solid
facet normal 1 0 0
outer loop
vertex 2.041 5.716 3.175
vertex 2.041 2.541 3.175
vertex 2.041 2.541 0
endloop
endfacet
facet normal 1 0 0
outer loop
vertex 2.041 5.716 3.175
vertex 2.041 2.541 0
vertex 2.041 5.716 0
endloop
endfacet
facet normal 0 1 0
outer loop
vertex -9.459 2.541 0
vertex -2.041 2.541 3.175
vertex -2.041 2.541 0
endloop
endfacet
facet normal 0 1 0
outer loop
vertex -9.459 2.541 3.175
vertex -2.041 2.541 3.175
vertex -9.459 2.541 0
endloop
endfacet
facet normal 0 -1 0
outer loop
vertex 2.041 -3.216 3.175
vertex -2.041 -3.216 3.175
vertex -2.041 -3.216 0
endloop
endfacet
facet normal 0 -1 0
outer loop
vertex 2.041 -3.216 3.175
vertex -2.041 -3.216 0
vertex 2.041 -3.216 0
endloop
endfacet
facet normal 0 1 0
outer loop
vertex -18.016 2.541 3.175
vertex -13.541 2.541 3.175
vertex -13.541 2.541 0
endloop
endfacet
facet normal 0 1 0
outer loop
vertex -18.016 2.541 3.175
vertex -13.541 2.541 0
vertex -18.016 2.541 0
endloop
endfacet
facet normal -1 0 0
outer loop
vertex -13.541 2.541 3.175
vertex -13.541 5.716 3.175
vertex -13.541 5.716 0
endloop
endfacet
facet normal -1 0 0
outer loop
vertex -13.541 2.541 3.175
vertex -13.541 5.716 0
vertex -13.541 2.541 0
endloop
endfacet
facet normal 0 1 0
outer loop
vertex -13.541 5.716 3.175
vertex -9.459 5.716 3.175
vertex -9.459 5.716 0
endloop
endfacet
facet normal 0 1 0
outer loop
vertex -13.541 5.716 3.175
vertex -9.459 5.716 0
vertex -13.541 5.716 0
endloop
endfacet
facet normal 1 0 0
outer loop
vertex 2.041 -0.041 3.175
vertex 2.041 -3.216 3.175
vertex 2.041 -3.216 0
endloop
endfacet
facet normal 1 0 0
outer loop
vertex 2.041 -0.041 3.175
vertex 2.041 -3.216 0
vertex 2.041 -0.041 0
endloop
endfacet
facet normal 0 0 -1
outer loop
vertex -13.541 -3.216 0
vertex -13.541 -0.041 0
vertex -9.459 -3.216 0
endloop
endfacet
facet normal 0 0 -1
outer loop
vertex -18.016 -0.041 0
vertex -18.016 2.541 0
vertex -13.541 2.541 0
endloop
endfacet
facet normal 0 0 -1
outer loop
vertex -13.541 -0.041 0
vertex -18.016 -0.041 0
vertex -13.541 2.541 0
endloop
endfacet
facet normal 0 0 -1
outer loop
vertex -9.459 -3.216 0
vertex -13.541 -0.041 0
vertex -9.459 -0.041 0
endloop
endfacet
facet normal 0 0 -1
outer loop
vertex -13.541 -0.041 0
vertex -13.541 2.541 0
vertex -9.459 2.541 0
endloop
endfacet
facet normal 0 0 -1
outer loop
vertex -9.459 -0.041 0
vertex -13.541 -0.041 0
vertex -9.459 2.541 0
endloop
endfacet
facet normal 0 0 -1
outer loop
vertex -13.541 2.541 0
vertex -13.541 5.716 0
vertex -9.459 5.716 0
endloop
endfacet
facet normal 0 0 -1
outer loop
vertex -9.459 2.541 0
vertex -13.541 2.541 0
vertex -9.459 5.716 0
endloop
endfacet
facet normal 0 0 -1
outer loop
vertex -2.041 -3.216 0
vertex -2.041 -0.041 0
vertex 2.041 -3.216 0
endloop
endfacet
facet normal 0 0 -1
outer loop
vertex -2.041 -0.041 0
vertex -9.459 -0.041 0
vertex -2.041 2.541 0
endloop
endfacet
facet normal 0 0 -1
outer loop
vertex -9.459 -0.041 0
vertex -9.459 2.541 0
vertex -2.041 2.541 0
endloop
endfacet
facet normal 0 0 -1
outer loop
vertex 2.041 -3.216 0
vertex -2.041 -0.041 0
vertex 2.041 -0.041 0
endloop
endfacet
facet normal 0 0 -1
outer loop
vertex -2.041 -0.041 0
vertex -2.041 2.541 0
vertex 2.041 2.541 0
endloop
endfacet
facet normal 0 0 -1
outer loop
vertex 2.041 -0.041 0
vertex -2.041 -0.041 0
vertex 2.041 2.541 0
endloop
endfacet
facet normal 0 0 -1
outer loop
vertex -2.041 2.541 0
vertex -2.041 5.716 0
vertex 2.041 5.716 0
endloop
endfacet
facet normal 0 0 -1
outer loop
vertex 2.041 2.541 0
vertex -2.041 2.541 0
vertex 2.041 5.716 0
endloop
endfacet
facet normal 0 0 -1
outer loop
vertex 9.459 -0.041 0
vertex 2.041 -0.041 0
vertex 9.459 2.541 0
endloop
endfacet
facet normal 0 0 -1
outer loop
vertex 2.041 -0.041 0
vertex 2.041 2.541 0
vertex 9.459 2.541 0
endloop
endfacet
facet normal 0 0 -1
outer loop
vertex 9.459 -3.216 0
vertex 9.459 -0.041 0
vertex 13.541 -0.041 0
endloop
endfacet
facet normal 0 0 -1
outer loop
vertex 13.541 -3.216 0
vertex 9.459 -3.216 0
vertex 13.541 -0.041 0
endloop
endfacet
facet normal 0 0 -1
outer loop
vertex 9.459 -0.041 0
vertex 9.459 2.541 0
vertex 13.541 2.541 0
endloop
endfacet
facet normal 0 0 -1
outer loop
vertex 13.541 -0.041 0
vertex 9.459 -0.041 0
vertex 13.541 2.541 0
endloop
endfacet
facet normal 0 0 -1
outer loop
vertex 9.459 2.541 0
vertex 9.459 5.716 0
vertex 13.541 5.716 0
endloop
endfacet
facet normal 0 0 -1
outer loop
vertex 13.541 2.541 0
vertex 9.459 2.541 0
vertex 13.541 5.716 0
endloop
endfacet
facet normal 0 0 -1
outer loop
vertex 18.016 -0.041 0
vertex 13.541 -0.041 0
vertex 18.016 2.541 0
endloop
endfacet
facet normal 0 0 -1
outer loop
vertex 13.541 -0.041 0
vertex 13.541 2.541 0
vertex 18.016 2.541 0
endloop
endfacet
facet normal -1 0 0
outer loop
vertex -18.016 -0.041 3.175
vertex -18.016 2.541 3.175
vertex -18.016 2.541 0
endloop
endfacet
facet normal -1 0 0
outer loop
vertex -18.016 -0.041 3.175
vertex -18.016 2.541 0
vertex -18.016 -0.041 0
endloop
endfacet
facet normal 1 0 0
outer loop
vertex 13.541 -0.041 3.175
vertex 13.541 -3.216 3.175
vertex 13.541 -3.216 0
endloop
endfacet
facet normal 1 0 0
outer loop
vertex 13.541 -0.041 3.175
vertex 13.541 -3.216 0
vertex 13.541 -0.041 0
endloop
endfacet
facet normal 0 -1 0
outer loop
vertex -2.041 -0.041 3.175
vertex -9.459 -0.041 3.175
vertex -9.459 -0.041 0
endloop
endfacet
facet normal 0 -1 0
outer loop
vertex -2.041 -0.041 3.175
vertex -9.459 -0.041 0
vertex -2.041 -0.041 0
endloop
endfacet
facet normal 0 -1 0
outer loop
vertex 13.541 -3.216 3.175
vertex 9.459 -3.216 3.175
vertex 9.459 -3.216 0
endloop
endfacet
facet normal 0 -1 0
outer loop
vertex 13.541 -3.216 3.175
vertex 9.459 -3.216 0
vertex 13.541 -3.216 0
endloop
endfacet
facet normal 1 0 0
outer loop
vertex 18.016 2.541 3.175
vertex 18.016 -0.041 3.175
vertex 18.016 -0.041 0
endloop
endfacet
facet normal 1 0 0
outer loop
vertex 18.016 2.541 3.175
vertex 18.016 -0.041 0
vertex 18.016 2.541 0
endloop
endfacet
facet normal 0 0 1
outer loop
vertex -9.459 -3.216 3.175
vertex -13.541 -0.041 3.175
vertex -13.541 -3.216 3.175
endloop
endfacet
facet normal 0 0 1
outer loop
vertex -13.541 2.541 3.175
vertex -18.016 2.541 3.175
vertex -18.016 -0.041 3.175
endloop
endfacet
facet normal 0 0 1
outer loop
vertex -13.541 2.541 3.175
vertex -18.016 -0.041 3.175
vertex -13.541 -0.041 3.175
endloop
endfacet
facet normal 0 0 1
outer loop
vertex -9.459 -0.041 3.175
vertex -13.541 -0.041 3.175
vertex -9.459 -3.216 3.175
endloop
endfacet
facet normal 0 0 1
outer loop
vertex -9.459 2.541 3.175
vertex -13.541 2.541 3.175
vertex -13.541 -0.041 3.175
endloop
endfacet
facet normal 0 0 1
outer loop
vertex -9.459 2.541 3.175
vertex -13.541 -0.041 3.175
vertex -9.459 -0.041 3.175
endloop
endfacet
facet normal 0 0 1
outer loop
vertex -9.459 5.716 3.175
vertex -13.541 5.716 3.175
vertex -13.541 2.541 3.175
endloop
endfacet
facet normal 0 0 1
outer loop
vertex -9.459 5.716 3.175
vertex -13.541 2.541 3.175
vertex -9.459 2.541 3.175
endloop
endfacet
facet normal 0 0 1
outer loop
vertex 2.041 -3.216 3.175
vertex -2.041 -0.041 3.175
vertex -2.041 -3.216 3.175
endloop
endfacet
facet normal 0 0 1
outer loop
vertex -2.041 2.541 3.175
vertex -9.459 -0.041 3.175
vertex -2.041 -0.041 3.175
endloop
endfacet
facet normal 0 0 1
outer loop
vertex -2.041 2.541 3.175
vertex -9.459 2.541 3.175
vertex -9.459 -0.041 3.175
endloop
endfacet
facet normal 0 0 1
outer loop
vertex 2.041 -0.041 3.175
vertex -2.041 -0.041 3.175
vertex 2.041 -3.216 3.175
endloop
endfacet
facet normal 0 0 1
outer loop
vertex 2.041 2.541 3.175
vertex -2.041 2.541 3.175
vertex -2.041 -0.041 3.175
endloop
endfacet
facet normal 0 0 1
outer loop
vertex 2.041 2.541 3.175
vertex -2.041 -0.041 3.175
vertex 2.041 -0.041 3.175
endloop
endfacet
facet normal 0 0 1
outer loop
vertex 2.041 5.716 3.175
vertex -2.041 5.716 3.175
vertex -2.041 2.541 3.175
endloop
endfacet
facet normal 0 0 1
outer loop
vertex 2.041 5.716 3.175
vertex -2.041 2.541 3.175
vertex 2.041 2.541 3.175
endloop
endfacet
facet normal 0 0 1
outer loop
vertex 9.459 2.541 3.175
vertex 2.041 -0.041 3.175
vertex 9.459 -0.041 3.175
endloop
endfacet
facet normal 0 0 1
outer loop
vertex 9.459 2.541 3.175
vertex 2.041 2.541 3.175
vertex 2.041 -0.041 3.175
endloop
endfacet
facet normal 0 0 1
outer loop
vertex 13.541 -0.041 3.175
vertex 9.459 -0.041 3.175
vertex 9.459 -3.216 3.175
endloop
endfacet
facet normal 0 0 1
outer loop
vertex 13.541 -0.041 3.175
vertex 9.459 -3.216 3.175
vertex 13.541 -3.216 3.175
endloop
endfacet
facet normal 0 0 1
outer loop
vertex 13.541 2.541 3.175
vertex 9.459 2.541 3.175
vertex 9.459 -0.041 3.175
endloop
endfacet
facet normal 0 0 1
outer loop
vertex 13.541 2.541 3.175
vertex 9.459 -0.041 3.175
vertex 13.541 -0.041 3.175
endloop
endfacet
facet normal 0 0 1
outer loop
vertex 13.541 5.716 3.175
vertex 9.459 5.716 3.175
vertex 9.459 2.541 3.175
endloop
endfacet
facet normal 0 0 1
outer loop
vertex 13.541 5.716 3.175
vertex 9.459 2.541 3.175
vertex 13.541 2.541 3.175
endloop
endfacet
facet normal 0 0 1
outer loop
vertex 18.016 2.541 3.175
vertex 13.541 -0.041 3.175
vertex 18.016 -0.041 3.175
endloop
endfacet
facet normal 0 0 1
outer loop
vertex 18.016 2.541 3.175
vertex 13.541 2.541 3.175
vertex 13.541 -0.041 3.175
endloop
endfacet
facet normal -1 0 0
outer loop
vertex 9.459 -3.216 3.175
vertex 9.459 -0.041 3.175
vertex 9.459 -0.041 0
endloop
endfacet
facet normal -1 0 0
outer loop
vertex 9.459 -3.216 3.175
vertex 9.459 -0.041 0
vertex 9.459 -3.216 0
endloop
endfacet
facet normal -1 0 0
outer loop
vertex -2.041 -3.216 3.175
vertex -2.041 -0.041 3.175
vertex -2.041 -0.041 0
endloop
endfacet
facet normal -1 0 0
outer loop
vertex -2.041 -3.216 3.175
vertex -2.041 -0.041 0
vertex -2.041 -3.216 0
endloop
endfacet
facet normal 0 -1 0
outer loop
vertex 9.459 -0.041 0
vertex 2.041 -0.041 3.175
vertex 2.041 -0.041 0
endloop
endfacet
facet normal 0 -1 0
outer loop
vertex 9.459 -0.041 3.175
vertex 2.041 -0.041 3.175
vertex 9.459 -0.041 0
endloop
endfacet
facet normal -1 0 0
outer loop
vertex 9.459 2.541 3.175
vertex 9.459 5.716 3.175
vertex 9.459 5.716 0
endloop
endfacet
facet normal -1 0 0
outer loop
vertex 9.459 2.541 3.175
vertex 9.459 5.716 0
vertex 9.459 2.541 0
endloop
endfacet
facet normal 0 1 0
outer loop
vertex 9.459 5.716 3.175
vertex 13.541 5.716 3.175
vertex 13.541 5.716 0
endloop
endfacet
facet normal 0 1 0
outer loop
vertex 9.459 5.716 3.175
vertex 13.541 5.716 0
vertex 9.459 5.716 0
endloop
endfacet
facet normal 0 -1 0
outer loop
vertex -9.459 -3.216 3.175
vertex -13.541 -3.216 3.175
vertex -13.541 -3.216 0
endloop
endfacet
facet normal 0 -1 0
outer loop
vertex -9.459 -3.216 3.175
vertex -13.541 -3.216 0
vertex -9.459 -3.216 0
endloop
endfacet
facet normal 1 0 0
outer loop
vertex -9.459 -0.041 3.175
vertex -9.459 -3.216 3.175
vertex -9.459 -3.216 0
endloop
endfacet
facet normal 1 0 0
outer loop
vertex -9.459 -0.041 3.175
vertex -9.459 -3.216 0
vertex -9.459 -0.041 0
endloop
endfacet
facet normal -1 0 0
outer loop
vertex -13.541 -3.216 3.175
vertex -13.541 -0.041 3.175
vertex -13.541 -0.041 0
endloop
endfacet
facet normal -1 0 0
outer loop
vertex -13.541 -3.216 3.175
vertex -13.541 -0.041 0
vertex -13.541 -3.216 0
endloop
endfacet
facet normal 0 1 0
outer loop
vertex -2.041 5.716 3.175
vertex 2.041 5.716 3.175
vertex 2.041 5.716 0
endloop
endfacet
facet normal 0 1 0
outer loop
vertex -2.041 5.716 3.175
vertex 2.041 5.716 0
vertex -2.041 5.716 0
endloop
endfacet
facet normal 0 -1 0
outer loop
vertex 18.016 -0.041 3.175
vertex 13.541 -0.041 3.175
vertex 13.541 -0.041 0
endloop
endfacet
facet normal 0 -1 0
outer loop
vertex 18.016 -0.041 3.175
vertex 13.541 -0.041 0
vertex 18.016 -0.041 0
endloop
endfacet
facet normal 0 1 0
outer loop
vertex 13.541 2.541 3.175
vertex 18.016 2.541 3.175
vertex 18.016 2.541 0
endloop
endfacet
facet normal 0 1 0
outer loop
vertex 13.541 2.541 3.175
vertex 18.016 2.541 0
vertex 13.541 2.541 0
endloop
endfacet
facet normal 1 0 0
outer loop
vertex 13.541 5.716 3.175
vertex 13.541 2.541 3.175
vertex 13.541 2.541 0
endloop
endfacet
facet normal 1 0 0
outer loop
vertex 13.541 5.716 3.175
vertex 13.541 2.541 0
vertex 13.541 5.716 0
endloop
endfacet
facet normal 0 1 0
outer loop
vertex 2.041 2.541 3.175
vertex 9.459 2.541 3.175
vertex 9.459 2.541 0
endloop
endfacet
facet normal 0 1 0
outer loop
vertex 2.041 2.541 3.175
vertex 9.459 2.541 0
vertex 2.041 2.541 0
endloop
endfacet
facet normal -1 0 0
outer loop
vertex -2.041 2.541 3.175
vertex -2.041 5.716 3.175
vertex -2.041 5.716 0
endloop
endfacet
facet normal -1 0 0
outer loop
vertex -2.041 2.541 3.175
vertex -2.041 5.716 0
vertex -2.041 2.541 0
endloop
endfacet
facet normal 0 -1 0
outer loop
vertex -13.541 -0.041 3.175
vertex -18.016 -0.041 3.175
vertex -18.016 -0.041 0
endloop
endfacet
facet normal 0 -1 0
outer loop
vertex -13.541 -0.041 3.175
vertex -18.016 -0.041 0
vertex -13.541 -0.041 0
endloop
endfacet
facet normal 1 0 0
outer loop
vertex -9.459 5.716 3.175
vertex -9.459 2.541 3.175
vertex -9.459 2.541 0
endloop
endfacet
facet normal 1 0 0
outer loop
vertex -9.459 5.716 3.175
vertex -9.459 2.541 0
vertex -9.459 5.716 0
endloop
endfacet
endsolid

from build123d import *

# Parameters (mm, degrees)
SKETCH1_W           = 4
SKETCH1_H           = 3.175
SKETCH1_W_2         = 42.3
SKETCH1_H_2         = 2.5
BOSS_EXTRUDE1_DEPTH = 3.175
CUT_EXTRUDE2_DEPTH  = 23.175
BOSS_EXTRUDE2_DEPTH = 3.175


with BuildPart() as part:
    # Sketch1 → Boss-Extrude1 (new body)
    with BuildSketch(Plane.XY):
        with Locations((-11.5, -1.5875)):
            Rectangle(SKETCH1_W, SKETCH1_H)
        with Locations((-11.5, 4.0875)):
            Rectangle(SKETCH1_W, SKETCH1_H)
        with Locations((0, 4.0875)):
            Rectangle(SKETCH1_W, SKETCH1_H)
        with Locations((0, -1.5875)):
            Rectangle(SKETCH1_W, SKETCH1_H)
        with Locations((11.5, 4.0875)):
            Rectangle(SKETCH1_W, SKETCH1_H)
        with Locations((11.5, -1.5875)):
            Rectangle(SKETCH1_W, SKETCH1_H)
        with Locations((0, 1.25)):
            Rectangle(SKETCH1_W_2, SKETCH1_H_2)
    extrude(amount=BOSS_EXTRUDE1_DEPTH)

    # Sketch2 → Cut-Extrude2 (cut)
    with BuildSketch(Plane(origin=(0, 2.5, 0), x_dir=(1, 0, 0), z_dir=(0, 1, 0))):
        Polygon((-17.975, 0), (-21.15, 0), (-21.15, -3.175), align=None)
        Polygon((-17.975, -3.175), (-17.975, 0), (-21.15, -3.175), align=None)
        Polygon((21.15, -3.175), (17.975, -3.175), (17.975, 0), align=None)
        Polygon((21.15, -3.175), (17.975, 0), (21.15, 0), align=None)
    extrude(amount=-CUT_EXTRUDE2_DEPTH, mode=Mode.SUBTRACT)

    # Sketch3 → Boss-Extrude2 (add)
    with BuildSketch(Plane.XY.offset(3.175)):
        Polygon((-13.54064, 2.54064), (-18.01564, 2.54064), (-18.01564, -0.04064), (-13.54064, -0.04064), (-13.54064, -3.21564), (-9.45936, -3.21564), (-9.45936, -0.04064), (-2.04064, -0.04064), (-2.04064, -3.21564), (2.04064, -3.21564), (2.04064, -0.04064), (9.45936, -0.04064), (9.45936, -3.21564), (13.54064, -3.21564), (13.54064, -0.04064), (18.01564, -0.04064), (18.01564, 2.54064), (13.54064, 2.54064), (13.54064, 5.71564), (9.45936, 5.71564), (9.45936, 2.54064), (2.04064, 2.54064), (2.04064, 5.71564), (-2.04064, 5.71564), (-2.04064, 2.54064), (-9.45936, 2.54064), (-9.45936, 5.71564), (-13.54064, 5.71564), align=None)
    extrude(amount=-BOSS_EXTRUDE2_DEPTH)


solid = part.part
